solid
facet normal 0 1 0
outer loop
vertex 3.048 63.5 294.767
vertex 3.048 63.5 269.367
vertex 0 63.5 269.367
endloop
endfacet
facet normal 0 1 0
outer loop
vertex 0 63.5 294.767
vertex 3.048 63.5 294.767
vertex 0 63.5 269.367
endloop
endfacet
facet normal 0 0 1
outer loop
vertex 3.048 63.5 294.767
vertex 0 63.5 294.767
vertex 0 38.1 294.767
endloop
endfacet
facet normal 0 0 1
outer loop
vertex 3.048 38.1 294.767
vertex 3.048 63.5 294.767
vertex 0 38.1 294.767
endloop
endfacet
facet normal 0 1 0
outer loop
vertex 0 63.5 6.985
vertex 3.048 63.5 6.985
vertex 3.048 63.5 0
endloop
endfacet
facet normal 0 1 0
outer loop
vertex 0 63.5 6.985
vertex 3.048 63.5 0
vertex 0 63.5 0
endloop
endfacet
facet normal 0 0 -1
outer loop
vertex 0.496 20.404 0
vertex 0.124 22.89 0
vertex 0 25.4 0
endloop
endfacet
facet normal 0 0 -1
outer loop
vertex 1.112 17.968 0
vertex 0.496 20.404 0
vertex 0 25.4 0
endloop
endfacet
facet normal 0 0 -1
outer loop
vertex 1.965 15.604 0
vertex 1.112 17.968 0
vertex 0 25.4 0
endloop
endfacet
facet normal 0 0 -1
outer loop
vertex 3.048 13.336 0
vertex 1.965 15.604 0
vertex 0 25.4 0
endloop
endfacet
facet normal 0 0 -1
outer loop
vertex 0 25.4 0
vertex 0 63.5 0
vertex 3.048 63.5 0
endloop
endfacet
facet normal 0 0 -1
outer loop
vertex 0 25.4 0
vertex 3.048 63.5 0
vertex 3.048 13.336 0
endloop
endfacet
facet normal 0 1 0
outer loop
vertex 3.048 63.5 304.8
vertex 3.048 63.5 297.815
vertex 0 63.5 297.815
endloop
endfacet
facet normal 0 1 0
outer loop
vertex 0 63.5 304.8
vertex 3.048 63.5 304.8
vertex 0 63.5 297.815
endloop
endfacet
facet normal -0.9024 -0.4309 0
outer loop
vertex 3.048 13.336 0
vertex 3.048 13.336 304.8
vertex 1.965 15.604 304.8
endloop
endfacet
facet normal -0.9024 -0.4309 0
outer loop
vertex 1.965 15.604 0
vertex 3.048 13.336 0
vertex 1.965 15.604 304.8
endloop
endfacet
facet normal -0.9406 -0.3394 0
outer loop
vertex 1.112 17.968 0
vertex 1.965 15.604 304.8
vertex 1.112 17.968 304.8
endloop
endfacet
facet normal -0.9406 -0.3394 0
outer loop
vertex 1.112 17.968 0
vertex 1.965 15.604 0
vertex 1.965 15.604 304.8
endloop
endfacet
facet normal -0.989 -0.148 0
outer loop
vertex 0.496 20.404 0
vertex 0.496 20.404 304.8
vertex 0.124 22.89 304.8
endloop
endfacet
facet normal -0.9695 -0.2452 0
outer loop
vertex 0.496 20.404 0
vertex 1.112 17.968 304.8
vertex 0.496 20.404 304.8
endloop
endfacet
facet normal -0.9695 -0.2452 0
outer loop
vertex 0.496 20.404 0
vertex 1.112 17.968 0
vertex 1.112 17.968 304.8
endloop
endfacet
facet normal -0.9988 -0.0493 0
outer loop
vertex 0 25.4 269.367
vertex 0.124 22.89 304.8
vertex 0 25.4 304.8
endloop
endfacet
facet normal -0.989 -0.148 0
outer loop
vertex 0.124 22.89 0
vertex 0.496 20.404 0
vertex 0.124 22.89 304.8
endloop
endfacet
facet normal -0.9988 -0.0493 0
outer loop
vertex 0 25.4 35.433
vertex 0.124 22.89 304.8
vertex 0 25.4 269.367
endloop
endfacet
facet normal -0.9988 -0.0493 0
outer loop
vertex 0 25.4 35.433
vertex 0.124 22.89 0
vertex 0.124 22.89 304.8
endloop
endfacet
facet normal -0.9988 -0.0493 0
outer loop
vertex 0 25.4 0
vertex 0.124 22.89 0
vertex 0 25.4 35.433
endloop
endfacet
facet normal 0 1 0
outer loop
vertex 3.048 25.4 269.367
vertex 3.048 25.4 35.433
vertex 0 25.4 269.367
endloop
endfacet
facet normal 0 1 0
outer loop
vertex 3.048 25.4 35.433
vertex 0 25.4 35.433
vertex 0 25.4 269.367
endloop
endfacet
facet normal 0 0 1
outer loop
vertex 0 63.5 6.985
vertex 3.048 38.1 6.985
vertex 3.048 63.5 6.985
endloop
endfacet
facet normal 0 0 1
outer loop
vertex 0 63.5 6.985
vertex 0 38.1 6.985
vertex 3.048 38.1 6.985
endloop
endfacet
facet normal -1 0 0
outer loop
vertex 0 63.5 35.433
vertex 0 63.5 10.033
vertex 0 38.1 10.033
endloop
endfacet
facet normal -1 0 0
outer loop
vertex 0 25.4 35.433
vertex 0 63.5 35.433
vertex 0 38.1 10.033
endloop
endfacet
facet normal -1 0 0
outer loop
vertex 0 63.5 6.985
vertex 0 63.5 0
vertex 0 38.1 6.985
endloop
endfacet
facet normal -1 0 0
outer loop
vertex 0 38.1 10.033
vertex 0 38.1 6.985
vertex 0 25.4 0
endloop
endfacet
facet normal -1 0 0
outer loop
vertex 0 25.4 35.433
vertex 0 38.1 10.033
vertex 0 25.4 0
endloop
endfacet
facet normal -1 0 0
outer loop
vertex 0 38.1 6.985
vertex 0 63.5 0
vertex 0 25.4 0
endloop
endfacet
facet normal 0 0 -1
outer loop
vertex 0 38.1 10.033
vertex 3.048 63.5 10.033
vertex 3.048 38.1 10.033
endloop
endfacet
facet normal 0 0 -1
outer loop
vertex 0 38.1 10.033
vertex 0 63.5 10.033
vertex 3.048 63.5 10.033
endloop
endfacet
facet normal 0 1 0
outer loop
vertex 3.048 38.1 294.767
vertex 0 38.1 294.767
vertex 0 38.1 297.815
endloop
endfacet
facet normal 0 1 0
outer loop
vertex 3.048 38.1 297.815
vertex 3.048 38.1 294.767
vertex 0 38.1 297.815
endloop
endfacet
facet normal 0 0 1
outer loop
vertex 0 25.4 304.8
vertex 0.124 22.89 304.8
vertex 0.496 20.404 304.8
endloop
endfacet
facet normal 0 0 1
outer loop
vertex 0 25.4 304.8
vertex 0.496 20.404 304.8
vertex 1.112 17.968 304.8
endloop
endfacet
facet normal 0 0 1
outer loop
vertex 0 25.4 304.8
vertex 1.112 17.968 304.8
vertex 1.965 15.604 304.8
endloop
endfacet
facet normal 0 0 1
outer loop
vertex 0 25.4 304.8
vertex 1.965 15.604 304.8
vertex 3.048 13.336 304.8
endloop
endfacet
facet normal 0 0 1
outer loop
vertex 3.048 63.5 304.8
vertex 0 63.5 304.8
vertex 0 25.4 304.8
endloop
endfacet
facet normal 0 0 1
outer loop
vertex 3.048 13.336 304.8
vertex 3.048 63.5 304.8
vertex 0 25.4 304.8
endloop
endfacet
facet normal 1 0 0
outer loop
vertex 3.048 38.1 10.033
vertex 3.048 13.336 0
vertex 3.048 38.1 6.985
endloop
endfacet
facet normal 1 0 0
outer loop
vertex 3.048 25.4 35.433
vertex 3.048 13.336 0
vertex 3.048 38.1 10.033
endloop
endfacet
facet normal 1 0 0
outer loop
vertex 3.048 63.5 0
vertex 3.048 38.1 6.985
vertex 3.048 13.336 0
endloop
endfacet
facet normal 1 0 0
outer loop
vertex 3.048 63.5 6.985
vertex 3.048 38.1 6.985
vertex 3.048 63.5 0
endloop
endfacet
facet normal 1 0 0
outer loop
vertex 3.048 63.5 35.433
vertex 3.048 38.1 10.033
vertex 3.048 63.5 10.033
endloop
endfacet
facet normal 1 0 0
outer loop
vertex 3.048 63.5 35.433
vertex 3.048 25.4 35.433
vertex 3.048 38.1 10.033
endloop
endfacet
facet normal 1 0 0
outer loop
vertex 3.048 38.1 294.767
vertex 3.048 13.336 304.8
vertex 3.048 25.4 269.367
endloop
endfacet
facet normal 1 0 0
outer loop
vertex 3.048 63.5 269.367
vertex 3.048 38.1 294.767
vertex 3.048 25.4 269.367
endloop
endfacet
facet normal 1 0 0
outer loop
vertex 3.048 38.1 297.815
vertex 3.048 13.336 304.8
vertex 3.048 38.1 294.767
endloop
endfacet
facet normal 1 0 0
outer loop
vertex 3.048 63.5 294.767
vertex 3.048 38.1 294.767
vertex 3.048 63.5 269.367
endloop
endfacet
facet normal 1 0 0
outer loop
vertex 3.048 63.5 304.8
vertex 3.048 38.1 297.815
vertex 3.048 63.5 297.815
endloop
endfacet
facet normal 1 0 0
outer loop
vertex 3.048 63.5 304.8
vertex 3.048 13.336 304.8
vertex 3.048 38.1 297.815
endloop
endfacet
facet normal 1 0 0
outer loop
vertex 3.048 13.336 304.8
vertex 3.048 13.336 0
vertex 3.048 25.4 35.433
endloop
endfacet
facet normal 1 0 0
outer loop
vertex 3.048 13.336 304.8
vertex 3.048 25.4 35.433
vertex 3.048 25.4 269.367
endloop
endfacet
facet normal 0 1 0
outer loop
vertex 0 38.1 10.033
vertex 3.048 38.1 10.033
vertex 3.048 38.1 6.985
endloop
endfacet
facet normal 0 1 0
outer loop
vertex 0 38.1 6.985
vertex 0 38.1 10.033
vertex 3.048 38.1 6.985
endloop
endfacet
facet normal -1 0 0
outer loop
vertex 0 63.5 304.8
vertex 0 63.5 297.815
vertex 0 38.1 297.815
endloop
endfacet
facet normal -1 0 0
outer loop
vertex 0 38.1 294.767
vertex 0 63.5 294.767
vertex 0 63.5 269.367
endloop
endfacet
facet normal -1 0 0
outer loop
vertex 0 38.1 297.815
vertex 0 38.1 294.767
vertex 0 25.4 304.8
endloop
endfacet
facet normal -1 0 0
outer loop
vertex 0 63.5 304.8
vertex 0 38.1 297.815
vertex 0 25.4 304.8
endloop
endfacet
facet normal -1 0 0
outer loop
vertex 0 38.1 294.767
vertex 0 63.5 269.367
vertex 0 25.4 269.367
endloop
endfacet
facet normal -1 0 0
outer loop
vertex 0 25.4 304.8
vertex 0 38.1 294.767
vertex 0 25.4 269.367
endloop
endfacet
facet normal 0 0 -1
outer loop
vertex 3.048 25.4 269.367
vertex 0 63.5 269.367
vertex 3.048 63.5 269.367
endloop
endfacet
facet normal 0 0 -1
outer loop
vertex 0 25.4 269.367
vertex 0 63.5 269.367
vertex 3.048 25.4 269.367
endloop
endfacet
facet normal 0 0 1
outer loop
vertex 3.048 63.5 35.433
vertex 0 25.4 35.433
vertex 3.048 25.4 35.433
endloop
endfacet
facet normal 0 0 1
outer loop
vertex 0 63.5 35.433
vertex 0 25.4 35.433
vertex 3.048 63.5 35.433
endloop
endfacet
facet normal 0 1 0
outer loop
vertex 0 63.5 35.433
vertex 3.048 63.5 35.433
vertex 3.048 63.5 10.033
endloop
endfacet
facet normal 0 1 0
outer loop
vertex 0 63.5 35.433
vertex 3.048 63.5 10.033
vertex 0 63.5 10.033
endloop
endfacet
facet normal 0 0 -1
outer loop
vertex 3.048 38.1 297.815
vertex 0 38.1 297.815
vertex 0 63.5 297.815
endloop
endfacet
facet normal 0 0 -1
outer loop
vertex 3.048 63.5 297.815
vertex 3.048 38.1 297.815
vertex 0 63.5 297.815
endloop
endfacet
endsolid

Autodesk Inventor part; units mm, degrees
ref_plane "YZ Plane" through (0, 0, 0) normal (1, 0, 0) x (0, 1, 0)
ref_plane "XZ Plane" through (0, 0, 0) normal (0, 1, 0) x (-1, 0, 0)
ref_plane "XY Plane" through (0, 0, 0) normal (0, 0, 1) x (1, 0, 0)
sketch "Sketch1" plane through (0, 0, 0) normal (0, 0, 1) x (1, 0, 0)
  line L0 (25.4, 0) -> (146.304, 0)
  line L1 (171.704, 25.4) -> (171.704, 63.5)
  line L2 (171.704, 63.5) -> (0, 63.5)
  line L3 (0, 63.5) -> (0, 25.4)
  arc A0 (0, 25.4) -> (25.4, 0) centre (25.4, 25.4) ccw
  arc A1 (146.304, 0) -> (171.704, 25.4) centre (146.304, 25.4) ccw
  point P0 (0, 0)
  dimension "d0" = 171.704
  dimension "d2" = 50.8
  dimension "d3" = 50.8
  dimension "d4" = 63.5
  dimension "d5" = 63.5
  dimension "d6" = 0
extrude "Extrusion1" add sketch "Sketch1" along normal blind 304.8
sketch "Sketch2" plane through (0, 0, 304.8) normal (0, 0, 1) x (1, 0, 0)
  line L0 (25.4, 0) -> (146.304, 0) projected
  line L1 (3.048, 63.5) -> (206.248, 63.5)
  line L2 (206.248, 63.5) -> (206.248, 0)
  line L3 (206.248, 0) -> (3.048, 0)
  line L4 (3.048, 0) -> (3.048, 63.5)
  line L5 (171.704, 63.5) -> (0, 63.5) projected
  line L6 (0, 63.5) -> (0, 25.4) projected
  point P0 (0, 0)
  dimension "d9" = 0
  dimension "d10" = 203.2
  dimension "d11" = 3.048
extrude "Extrusion2" cut sketch "Sketch2" against normal through all
sketch "Sketch5" plane through (0, 25.4, 0) normal (-1, 0, 0) x (0, 0, 1)
  line L0 (6.985, 38.1) -> (10.033, 38.1)
  line L1 (10.033, 38.1) -> (10.033, 12.7)
  line L2 (10.033, 12.7) -> (6.985, 12.7)
  line L3 (6.985, 12.7) -> (6.985, 38.1)
  line L4 (0, 38.1) -> (304.8, 38.1) projected
  line L5 (0, 38.1) -> (0, 0) projected
  line L6 (152.4, 38.1) -> (152.4, 0)
  line L7 (0, 0) -> (304.8, 0) projected
  line L8 (297.815, 38.1) -> (294.767, 38.1)
  line L9 (294.767, 38.1) -> (294.767, 12.7)
  line L10 (294.767, 12.7) -> (297.815, 12.7)
  line L11 (297.815, 12.7) -> (297.815, 38.1)
  line L12 (304.8, 38.1) -> (0, 38.1)
  line L13 (304.8, 38.1) -> (304.8, 0)
  point P0 (0, -25.4)
  point P1 (297.815, 38.1)
  point P2 (294.767, 38.1)
  dimension "d22" = 3.048
  dimension "d23" = 25.4
  dimension "d24" = 0
  dimension "d25" = 6.985
extrude "Extrusion5" cut sketch "Sketch5" against normal through all contours L0 L1 L2 L3 | L4 L11 L10 L9
sketch "Sketch6" plane through (0, 25.4, 0) normal (-1, 0, 0) x (0, 0, 1)
  line L0 (10.033, 38.1) -> (294.767, 38.1) projected
  line L1 (0, 0) -> (304.8, 0) projected
  line L2 (35.433, 38.1) -> (269.367, 38.1)
  line L3 (269.367, 38.1) -> (269.367, 0)
  line L4 (269.367, 0) -> (35.433, 0)
  line L5 (35.433, 0) -> (35.433, 38.1)
  line L6 (10.033, 38.1) -> (10.033, 12.7) projected
  line L7 (294.767, 12.7) -> (294.767, 38.1) projected
  point P0 (0, -25.4)
  point P1 (35.433, 0)
  dimension "d28" = 25.4
  dimension "d29" = 25.4
extrude "Extrusion6" cut sketch "Sketch6" against normal through all
properties part number "Battery_container_side"
